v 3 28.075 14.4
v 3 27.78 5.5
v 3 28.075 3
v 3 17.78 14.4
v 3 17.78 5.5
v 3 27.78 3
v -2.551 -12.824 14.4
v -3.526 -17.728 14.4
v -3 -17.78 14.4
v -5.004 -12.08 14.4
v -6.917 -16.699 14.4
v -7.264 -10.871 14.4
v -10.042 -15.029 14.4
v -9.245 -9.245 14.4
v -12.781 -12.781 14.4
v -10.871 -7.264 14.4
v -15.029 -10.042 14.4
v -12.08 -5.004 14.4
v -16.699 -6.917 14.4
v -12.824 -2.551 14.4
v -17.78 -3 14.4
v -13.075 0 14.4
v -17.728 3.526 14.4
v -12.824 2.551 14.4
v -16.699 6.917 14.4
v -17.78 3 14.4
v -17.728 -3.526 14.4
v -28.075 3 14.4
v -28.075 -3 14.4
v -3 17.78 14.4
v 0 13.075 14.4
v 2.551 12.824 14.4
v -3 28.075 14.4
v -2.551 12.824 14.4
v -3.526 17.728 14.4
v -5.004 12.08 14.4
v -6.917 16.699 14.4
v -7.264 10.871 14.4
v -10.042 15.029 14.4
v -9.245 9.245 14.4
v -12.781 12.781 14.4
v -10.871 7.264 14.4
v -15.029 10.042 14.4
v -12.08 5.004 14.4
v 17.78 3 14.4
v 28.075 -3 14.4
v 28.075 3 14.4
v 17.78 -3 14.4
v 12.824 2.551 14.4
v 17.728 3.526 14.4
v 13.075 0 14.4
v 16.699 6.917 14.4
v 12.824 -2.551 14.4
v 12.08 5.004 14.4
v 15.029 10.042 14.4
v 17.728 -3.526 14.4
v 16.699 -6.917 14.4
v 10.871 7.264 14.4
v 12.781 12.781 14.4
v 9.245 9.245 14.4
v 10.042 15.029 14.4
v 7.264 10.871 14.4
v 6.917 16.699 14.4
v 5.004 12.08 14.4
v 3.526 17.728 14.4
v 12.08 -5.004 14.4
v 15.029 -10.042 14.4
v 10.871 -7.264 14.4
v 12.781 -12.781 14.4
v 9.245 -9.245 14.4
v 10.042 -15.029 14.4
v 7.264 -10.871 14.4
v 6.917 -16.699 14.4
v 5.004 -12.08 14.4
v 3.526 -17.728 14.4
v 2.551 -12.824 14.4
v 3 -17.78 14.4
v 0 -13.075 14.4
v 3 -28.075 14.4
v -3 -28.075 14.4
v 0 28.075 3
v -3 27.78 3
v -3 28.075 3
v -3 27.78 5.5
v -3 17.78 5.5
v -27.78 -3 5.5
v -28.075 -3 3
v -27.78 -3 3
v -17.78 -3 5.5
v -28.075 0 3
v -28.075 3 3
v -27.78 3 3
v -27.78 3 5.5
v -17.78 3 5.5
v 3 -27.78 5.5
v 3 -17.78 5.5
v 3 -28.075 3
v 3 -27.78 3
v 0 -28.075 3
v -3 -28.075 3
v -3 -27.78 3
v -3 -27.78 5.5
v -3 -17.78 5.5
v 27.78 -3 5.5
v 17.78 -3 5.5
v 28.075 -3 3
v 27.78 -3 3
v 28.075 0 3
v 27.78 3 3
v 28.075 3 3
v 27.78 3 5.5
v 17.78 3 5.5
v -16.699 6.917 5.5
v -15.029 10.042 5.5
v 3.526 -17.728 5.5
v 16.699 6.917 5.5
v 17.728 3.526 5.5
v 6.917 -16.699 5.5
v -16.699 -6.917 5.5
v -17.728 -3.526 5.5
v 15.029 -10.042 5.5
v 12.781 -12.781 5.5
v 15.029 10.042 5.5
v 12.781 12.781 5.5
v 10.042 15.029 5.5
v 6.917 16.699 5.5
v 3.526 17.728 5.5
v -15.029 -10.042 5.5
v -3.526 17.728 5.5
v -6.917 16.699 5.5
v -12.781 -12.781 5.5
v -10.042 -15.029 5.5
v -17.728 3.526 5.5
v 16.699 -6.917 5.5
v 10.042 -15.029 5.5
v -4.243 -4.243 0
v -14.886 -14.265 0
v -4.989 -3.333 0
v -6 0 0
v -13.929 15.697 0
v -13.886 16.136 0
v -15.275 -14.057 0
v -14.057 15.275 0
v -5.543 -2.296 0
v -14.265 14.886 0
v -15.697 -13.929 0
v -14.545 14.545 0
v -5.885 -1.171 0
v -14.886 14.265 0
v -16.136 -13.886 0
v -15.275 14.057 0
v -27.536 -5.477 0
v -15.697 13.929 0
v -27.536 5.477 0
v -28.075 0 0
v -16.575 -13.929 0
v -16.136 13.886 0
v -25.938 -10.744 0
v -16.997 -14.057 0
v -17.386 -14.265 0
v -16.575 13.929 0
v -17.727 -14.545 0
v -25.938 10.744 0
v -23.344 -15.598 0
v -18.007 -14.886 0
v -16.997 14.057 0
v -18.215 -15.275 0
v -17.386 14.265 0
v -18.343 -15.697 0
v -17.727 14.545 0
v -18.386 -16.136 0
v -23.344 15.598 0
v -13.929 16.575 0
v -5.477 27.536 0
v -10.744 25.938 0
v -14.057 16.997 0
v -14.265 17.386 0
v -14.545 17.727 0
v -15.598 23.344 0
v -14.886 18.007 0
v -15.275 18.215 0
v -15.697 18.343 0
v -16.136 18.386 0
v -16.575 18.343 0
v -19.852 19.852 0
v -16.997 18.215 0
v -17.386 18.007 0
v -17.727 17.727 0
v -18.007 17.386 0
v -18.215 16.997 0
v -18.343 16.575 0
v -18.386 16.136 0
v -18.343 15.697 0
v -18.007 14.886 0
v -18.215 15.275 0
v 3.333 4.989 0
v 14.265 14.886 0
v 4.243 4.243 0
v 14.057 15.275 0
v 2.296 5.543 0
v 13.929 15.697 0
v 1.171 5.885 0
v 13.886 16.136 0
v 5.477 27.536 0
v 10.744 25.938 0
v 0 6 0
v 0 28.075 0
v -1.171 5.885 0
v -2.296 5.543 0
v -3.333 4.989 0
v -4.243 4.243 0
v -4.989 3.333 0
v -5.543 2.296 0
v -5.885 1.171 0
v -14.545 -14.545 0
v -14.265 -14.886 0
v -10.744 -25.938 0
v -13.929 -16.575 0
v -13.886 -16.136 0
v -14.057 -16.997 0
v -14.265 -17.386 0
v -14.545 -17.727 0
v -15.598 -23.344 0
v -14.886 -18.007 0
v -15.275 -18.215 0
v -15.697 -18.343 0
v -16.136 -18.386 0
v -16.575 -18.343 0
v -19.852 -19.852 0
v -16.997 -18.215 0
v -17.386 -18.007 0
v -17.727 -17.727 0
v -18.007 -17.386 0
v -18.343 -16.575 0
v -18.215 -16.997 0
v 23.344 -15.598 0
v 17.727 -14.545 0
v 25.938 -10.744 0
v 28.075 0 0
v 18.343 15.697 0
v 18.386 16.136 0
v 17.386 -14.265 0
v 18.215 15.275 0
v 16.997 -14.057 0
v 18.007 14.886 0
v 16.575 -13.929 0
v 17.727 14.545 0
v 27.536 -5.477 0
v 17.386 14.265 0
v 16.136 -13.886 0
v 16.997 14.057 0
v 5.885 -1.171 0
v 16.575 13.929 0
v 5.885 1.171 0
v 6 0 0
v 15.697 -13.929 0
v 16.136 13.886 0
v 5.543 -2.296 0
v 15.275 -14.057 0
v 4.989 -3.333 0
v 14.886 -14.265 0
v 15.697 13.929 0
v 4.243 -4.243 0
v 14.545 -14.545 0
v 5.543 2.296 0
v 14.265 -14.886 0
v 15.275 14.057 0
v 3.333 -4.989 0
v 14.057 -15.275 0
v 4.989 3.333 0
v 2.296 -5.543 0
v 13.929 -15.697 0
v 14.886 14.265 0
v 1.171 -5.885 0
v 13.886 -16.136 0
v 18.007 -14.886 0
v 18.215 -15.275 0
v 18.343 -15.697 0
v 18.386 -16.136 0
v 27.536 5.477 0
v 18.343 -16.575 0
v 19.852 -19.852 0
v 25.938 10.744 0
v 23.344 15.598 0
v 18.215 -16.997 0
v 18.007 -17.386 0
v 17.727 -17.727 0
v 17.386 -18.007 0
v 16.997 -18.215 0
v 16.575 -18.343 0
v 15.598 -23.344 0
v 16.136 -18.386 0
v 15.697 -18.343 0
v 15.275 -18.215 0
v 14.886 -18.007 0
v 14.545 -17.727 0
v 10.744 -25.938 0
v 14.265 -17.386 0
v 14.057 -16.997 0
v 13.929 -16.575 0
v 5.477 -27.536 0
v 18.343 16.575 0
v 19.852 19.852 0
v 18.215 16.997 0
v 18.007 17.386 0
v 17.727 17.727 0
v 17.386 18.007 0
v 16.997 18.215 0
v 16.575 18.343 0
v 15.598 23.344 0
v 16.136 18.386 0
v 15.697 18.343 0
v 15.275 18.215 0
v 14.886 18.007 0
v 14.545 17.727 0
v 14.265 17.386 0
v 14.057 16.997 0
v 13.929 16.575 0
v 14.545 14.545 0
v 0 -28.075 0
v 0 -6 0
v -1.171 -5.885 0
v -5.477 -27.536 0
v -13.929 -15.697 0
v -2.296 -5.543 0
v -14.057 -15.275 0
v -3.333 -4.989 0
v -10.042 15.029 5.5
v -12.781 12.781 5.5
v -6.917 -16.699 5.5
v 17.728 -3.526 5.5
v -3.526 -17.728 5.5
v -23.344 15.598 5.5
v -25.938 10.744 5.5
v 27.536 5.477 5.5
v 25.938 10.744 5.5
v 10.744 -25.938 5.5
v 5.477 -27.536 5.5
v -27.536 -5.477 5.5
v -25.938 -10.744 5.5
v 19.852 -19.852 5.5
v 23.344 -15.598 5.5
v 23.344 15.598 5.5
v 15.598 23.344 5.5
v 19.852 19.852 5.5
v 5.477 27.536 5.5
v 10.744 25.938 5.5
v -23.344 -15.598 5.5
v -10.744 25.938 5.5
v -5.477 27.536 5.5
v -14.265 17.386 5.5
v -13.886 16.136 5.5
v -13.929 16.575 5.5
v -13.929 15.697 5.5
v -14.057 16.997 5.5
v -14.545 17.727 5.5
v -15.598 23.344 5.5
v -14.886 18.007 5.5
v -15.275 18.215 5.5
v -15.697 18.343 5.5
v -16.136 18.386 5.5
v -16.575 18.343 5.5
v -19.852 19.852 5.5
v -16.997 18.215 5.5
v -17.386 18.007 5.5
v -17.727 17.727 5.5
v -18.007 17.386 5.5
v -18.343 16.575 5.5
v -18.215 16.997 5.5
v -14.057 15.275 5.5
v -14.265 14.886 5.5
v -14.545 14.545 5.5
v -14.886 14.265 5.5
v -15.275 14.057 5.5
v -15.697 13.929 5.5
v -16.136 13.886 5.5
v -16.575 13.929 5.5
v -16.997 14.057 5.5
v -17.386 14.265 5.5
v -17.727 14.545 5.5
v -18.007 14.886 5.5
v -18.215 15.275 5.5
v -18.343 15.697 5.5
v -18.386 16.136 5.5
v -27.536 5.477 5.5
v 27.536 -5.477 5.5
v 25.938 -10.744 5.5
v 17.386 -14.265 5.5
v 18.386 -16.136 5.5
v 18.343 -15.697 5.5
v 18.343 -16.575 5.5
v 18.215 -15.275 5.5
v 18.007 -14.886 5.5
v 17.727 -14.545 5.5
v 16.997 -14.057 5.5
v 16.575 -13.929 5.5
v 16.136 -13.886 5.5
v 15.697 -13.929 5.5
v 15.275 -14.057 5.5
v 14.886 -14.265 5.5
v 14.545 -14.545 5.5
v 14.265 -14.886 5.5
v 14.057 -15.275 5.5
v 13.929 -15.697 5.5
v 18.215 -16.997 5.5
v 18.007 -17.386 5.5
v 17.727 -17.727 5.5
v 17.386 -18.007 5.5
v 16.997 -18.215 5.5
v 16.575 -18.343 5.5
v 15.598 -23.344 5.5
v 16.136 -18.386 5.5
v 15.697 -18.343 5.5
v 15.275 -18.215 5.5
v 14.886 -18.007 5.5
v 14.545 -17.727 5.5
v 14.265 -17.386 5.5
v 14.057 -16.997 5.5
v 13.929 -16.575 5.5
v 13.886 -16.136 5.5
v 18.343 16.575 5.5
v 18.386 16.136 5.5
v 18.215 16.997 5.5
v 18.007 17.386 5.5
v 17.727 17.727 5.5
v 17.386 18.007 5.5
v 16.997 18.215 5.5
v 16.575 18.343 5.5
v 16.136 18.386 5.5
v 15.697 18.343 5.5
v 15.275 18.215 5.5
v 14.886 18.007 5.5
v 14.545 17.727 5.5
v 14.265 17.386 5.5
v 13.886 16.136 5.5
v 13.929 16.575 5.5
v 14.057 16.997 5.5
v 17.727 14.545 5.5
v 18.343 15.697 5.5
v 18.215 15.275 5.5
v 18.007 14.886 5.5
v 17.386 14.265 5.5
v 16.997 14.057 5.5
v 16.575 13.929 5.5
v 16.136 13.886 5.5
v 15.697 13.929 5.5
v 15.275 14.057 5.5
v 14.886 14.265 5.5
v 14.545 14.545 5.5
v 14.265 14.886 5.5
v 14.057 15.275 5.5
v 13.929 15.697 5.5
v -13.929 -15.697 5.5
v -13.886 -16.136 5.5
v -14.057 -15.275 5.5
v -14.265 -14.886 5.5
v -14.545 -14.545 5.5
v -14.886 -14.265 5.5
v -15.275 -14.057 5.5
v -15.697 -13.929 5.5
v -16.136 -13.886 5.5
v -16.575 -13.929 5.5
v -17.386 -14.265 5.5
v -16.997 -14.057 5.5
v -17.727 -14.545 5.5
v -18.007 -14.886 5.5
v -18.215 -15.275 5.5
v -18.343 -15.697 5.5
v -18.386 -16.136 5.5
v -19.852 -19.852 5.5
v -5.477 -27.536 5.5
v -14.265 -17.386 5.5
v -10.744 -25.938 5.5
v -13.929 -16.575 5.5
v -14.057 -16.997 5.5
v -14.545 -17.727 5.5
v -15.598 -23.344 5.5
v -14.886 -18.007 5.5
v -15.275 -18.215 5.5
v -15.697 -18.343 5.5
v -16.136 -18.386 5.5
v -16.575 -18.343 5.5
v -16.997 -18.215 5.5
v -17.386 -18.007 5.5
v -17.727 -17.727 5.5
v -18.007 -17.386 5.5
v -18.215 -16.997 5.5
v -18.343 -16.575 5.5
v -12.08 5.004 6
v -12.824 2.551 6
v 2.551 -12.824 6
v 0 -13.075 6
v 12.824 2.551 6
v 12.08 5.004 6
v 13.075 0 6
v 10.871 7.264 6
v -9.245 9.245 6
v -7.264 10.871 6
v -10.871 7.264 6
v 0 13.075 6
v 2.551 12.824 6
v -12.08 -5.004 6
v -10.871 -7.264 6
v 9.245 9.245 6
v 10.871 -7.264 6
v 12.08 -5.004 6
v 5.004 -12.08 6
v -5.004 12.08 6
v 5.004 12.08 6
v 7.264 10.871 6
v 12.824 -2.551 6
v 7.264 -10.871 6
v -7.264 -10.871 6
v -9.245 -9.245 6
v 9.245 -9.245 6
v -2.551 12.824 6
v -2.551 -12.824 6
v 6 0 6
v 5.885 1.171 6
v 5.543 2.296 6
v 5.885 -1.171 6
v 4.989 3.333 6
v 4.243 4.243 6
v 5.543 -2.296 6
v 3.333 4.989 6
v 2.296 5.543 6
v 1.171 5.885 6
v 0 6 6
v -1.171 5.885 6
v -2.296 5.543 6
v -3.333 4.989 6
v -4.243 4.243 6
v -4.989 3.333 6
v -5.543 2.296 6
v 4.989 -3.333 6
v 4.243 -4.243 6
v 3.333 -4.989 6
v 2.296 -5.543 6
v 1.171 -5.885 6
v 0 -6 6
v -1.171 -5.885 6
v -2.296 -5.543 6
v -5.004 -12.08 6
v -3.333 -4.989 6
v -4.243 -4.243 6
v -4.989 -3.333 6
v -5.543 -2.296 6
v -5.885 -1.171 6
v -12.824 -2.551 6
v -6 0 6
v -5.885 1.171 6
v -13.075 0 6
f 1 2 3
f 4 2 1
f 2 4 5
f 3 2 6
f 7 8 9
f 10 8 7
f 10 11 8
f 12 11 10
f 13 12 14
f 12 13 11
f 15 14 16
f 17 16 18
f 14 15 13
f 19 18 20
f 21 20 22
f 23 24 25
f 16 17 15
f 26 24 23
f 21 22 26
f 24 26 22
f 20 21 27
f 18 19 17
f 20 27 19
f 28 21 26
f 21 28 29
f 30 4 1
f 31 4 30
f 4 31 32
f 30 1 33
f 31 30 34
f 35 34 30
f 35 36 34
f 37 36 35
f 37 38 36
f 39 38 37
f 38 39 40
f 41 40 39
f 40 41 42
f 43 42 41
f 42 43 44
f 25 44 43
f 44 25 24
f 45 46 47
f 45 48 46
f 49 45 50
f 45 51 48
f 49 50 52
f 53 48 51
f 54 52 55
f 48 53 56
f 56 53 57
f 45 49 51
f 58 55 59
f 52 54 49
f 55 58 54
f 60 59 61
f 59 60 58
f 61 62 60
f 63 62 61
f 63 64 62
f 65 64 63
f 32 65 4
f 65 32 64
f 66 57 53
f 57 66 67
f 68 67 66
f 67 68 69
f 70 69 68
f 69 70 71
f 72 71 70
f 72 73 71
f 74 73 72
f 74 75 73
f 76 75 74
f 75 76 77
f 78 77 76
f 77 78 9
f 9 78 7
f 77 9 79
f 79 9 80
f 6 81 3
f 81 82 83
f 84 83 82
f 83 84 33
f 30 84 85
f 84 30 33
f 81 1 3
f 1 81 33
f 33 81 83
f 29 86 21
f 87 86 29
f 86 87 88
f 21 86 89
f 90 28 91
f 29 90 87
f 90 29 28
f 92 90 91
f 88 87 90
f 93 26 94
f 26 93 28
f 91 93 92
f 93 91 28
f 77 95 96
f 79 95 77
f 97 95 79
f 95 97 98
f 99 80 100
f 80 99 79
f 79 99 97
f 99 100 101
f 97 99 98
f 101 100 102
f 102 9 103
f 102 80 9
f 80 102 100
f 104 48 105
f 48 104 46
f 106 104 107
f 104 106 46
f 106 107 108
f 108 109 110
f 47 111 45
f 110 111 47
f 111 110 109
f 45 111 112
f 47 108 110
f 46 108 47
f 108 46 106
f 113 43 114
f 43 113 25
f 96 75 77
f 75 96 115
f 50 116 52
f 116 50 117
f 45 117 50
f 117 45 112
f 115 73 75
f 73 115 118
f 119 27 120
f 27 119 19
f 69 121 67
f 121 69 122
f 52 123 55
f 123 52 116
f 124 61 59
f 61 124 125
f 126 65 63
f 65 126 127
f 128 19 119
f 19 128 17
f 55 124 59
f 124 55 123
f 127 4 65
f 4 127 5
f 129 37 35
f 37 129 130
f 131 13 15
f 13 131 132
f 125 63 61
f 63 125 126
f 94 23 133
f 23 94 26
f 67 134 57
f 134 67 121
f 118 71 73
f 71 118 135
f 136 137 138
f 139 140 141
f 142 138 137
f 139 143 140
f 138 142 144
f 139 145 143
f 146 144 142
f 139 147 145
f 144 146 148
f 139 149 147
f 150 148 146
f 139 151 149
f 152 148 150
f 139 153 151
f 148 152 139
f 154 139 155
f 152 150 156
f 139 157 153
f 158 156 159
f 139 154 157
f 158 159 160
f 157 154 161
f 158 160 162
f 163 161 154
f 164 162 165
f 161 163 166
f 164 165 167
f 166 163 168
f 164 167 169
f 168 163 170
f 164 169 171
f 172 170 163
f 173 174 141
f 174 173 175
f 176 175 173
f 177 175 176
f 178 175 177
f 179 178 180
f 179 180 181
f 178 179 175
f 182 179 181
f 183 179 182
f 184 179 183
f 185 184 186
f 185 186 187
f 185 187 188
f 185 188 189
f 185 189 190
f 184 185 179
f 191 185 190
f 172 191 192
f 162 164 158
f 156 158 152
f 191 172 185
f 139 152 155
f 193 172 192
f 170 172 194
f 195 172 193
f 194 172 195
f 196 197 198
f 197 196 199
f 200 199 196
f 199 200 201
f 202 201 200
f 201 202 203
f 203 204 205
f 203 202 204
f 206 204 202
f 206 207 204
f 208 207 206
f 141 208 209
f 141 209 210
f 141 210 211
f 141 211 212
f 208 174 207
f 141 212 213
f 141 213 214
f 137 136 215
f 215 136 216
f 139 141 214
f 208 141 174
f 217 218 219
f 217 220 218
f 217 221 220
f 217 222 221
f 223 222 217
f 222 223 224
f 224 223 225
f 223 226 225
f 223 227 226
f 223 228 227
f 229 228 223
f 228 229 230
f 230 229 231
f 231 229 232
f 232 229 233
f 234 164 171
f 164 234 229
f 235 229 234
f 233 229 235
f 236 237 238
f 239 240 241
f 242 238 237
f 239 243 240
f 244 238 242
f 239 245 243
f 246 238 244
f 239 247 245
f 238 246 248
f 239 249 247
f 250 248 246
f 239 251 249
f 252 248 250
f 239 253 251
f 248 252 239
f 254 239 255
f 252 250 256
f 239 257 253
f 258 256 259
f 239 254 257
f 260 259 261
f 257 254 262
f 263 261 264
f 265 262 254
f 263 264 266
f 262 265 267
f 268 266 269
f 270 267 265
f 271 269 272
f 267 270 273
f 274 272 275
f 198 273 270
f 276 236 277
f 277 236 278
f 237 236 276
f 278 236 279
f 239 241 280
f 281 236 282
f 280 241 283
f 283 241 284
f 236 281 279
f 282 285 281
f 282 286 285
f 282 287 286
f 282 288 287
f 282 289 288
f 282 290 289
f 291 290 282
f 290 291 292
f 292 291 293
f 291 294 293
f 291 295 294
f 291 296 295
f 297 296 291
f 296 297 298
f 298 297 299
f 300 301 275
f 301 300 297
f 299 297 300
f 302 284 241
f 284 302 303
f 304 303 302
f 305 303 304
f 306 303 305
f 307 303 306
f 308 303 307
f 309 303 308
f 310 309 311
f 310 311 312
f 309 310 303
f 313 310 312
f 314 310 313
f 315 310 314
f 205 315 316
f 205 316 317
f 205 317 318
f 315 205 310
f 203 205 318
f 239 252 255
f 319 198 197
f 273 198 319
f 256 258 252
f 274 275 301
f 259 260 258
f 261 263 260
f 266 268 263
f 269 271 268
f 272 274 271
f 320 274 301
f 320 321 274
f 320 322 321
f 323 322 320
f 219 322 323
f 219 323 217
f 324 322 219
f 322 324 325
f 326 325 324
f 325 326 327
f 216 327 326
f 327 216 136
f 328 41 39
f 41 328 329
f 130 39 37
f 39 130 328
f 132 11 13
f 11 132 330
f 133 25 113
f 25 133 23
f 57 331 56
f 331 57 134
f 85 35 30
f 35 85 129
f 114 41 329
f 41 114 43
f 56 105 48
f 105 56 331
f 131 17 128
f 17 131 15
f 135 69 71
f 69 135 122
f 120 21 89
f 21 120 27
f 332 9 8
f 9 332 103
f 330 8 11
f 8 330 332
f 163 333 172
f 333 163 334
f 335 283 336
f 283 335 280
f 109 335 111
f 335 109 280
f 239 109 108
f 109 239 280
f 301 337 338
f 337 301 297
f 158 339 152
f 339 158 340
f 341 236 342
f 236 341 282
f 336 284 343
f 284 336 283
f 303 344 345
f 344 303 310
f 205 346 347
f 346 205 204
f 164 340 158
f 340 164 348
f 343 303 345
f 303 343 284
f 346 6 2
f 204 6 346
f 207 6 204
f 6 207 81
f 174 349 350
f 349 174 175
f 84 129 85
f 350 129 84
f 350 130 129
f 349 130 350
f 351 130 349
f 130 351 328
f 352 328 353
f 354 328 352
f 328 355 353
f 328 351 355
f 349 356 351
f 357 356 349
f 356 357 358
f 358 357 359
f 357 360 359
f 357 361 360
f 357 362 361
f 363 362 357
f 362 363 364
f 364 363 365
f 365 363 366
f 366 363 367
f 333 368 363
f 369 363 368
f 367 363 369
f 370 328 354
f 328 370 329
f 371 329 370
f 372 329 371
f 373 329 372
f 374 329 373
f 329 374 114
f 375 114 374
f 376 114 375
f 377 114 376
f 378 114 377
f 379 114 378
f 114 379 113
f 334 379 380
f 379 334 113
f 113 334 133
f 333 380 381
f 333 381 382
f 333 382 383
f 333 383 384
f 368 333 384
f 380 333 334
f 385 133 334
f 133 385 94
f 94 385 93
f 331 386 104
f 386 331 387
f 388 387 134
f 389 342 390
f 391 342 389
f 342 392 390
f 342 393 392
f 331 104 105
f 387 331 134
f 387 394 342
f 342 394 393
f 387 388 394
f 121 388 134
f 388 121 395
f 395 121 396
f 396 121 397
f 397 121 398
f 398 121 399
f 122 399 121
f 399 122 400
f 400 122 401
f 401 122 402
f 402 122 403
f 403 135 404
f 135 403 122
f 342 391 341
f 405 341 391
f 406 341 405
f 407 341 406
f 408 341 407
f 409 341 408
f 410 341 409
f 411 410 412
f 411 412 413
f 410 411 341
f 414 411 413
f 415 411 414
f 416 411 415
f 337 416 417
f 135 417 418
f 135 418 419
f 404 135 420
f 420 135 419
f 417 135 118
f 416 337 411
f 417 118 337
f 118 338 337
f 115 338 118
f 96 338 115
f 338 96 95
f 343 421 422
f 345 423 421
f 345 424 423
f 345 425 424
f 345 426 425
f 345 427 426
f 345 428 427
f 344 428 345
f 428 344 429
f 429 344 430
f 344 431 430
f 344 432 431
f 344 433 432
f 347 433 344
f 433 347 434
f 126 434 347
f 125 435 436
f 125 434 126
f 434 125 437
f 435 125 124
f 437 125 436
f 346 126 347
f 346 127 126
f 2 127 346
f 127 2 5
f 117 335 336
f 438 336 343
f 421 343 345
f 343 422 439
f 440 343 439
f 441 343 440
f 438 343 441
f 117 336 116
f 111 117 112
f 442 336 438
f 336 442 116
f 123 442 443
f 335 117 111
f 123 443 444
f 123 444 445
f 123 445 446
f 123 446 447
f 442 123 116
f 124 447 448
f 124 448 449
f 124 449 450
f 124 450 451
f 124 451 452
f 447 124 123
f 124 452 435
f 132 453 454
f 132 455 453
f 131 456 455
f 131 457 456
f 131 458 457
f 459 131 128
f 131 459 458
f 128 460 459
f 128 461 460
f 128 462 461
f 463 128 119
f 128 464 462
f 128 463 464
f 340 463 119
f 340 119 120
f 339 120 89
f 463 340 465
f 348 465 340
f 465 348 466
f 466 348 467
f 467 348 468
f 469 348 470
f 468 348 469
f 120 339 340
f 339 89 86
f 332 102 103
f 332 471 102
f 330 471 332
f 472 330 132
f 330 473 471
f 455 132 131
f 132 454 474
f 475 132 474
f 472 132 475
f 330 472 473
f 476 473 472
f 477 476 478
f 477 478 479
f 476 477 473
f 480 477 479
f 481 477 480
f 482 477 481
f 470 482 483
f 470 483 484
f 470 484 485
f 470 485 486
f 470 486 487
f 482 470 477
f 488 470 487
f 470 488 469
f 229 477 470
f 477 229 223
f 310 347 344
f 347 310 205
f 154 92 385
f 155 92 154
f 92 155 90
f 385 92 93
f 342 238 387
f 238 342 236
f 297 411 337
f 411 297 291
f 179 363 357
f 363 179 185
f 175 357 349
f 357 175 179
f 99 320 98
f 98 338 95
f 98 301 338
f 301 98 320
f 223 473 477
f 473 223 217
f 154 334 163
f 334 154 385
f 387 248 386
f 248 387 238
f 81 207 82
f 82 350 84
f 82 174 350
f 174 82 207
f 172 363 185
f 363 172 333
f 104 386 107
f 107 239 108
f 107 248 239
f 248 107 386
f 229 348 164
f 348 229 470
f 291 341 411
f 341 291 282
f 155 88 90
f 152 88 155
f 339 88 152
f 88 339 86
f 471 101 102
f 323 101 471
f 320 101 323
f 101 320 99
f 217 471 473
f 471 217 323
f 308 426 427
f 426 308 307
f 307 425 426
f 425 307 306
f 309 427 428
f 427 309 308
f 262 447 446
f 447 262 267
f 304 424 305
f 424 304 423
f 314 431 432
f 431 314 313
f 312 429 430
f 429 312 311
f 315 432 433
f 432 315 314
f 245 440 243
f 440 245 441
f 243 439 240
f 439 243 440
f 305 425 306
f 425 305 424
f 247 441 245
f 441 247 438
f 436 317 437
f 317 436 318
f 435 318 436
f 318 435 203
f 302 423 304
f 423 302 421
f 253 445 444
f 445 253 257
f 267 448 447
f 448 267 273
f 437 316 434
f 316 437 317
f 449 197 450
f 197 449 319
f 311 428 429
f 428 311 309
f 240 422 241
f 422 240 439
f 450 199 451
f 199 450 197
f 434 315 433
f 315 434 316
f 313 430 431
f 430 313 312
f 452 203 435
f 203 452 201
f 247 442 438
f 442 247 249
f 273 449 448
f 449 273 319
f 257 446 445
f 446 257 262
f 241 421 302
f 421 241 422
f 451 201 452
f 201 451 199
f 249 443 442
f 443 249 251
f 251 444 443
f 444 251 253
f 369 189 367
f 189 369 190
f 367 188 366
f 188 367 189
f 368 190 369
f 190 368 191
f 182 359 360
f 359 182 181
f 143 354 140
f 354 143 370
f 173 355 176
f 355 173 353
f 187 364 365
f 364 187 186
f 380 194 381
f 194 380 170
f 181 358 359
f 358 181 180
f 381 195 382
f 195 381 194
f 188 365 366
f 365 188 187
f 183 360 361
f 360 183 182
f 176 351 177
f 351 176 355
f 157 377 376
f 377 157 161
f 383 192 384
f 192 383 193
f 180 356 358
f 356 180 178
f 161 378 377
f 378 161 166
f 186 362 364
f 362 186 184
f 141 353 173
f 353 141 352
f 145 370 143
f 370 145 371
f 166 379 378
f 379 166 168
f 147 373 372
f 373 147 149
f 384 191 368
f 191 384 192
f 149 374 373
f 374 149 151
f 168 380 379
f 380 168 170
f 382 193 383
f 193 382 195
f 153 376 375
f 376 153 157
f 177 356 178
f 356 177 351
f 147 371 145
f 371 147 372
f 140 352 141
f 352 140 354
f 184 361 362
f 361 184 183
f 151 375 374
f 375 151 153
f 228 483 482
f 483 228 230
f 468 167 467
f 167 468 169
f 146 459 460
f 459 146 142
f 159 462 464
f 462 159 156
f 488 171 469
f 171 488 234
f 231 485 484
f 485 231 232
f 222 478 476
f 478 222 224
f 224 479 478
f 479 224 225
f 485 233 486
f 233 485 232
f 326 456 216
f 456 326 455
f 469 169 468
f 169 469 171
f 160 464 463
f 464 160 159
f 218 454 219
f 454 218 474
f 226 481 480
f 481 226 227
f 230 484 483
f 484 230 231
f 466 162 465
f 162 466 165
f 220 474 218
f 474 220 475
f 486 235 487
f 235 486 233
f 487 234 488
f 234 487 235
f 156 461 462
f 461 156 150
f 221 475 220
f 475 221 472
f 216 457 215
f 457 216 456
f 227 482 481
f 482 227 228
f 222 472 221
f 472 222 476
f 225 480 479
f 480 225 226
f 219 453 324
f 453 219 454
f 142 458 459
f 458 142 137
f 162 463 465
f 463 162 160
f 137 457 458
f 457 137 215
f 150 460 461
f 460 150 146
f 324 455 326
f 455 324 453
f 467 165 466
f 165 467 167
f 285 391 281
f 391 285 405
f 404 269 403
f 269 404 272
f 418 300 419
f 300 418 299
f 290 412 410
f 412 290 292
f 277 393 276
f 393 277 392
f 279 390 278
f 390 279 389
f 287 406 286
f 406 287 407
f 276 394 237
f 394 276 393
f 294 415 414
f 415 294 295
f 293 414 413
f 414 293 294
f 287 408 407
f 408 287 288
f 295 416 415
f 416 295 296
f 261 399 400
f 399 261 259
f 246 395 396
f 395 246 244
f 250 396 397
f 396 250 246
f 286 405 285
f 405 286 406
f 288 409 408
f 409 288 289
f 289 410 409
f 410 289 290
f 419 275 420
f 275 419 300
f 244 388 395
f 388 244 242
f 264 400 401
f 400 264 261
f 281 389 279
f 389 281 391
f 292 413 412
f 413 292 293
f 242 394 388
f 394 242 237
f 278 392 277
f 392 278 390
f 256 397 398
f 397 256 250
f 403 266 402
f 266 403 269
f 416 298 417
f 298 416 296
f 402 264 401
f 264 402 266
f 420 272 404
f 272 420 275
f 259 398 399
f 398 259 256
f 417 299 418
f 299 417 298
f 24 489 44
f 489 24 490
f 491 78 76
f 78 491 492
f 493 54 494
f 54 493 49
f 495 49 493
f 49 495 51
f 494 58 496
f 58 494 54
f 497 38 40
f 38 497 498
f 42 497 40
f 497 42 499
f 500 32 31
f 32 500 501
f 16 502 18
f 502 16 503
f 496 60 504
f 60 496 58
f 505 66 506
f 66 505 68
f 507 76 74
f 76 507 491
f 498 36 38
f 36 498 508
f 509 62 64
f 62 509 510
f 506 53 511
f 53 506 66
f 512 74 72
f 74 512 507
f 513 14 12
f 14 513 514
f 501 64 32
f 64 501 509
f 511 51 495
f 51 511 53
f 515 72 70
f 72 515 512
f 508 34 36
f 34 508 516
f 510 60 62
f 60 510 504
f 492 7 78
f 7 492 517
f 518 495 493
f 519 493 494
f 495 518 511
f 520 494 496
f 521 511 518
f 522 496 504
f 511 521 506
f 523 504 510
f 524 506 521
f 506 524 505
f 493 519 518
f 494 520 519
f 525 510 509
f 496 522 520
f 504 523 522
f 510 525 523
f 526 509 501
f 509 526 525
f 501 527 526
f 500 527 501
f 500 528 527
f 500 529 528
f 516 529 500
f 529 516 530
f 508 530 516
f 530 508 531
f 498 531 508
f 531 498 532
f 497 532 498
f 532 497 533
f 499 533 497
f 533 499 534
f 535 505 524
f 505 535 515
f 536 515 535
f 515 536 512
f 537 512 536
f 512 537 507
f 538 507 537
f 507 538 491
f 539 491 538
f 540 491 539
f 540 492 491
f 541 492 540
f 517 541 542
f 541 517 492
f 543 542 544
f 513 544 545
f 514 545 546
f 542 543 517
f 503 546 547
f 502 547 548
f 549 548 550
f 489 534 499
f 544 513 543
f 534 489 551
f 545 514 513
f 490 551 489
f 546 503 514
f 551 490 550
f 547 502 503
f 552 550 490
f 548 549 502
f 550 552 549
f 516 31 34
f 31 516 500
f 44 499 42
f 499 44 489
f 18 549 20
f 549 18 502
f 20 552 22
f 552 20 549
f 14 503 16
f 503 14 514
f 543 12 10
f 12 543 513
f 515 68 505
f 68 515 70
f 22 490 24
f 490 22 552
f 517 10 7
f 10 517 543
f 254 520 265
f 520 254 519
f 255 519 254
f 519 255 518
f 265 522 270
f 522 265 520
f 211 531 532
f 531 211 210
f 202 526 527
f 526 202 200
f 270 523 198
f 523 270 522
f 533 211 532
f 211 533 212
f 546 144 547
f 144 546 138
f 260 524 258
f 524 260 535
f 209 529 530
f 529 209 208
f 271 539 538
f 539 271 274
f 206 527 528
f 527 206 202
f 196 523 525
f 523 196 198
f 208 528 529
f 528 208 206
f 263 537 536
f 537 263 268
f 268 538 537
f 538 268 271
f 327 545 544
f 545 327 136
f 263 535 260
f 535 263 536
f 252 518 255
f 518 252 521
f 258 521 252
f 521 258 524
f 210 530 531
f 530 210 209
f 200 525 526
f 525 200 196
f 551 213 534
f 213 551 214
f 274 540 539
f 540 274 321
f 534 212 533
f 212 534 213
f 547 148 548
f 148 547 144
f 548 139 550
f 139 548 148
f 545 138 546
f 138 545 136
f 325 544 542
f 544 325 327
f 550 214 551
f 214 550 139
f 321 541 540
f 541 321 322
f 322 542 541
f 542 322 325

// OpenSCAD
$fn = 32;

// ----------------------------------------------------------------------
// Bearing housing: seat for 6000 (26 x 8 mm), 36.15 mm body
// ----------------------------------------------------------------------

// --- parameters (mm) ---
housing_d = 36.15;        // housing outside diameter
housing_h = 14.4;         // overall housing height
wall_t = 5;               // wall thickness
seat_d = 26.15;           // 6000 seat, 0.15 mm clearance
seat_h = 8.4;             // pocket depth
shoulder = 2;             // shoulder under the bearing
pass_d = 12;              // shaft passage
flange_d = 56.15;         // mounting flange diameter
flange_t = 4;             // flange thickness
bolt_d = 4.5;             // flange bolt clearance
bolt_r = 22.82;           // flange bolt circle radius
rib_w = 6;                // rib width
rib_n = 4;                // rib count

module body() {
  cylinder(h = housing_h, d = housing_d);
}

module flange() {
  /* flange sunk 1.5 mm into the body */
  cylinder(h = flange_t + 1.5, d = flange_d);
}

module ribs() {
  for (i = [0 : rib_n - 1])
    rotate([0, 0, i * 360 / rib_n])
      translate([-rib_w / 2, housing_d / 2 - 0.8, flange_t - 1])
        cube([rib_w, (flange_d - housing_d) / 2 + 0.8, housing_h - flange_t + 1]);
}

difference() {
  union() {
    body();
    flange();
    ribs();
  }
  translate([0, 0, housing_h - seat_h]) cylinder(h = seat_h + 1, d = seat_d);
  translate([0, 0, -1]) cylinder(h = housing_h - seat_h + 1, d = pass_d);
  for (i = [0 : 3]) rotate([0, 0, 45 + i * 90]) translate([bolt_r, 0, -1])
    cylinder(h = flange_t + 3, d = bolt_d);
}
